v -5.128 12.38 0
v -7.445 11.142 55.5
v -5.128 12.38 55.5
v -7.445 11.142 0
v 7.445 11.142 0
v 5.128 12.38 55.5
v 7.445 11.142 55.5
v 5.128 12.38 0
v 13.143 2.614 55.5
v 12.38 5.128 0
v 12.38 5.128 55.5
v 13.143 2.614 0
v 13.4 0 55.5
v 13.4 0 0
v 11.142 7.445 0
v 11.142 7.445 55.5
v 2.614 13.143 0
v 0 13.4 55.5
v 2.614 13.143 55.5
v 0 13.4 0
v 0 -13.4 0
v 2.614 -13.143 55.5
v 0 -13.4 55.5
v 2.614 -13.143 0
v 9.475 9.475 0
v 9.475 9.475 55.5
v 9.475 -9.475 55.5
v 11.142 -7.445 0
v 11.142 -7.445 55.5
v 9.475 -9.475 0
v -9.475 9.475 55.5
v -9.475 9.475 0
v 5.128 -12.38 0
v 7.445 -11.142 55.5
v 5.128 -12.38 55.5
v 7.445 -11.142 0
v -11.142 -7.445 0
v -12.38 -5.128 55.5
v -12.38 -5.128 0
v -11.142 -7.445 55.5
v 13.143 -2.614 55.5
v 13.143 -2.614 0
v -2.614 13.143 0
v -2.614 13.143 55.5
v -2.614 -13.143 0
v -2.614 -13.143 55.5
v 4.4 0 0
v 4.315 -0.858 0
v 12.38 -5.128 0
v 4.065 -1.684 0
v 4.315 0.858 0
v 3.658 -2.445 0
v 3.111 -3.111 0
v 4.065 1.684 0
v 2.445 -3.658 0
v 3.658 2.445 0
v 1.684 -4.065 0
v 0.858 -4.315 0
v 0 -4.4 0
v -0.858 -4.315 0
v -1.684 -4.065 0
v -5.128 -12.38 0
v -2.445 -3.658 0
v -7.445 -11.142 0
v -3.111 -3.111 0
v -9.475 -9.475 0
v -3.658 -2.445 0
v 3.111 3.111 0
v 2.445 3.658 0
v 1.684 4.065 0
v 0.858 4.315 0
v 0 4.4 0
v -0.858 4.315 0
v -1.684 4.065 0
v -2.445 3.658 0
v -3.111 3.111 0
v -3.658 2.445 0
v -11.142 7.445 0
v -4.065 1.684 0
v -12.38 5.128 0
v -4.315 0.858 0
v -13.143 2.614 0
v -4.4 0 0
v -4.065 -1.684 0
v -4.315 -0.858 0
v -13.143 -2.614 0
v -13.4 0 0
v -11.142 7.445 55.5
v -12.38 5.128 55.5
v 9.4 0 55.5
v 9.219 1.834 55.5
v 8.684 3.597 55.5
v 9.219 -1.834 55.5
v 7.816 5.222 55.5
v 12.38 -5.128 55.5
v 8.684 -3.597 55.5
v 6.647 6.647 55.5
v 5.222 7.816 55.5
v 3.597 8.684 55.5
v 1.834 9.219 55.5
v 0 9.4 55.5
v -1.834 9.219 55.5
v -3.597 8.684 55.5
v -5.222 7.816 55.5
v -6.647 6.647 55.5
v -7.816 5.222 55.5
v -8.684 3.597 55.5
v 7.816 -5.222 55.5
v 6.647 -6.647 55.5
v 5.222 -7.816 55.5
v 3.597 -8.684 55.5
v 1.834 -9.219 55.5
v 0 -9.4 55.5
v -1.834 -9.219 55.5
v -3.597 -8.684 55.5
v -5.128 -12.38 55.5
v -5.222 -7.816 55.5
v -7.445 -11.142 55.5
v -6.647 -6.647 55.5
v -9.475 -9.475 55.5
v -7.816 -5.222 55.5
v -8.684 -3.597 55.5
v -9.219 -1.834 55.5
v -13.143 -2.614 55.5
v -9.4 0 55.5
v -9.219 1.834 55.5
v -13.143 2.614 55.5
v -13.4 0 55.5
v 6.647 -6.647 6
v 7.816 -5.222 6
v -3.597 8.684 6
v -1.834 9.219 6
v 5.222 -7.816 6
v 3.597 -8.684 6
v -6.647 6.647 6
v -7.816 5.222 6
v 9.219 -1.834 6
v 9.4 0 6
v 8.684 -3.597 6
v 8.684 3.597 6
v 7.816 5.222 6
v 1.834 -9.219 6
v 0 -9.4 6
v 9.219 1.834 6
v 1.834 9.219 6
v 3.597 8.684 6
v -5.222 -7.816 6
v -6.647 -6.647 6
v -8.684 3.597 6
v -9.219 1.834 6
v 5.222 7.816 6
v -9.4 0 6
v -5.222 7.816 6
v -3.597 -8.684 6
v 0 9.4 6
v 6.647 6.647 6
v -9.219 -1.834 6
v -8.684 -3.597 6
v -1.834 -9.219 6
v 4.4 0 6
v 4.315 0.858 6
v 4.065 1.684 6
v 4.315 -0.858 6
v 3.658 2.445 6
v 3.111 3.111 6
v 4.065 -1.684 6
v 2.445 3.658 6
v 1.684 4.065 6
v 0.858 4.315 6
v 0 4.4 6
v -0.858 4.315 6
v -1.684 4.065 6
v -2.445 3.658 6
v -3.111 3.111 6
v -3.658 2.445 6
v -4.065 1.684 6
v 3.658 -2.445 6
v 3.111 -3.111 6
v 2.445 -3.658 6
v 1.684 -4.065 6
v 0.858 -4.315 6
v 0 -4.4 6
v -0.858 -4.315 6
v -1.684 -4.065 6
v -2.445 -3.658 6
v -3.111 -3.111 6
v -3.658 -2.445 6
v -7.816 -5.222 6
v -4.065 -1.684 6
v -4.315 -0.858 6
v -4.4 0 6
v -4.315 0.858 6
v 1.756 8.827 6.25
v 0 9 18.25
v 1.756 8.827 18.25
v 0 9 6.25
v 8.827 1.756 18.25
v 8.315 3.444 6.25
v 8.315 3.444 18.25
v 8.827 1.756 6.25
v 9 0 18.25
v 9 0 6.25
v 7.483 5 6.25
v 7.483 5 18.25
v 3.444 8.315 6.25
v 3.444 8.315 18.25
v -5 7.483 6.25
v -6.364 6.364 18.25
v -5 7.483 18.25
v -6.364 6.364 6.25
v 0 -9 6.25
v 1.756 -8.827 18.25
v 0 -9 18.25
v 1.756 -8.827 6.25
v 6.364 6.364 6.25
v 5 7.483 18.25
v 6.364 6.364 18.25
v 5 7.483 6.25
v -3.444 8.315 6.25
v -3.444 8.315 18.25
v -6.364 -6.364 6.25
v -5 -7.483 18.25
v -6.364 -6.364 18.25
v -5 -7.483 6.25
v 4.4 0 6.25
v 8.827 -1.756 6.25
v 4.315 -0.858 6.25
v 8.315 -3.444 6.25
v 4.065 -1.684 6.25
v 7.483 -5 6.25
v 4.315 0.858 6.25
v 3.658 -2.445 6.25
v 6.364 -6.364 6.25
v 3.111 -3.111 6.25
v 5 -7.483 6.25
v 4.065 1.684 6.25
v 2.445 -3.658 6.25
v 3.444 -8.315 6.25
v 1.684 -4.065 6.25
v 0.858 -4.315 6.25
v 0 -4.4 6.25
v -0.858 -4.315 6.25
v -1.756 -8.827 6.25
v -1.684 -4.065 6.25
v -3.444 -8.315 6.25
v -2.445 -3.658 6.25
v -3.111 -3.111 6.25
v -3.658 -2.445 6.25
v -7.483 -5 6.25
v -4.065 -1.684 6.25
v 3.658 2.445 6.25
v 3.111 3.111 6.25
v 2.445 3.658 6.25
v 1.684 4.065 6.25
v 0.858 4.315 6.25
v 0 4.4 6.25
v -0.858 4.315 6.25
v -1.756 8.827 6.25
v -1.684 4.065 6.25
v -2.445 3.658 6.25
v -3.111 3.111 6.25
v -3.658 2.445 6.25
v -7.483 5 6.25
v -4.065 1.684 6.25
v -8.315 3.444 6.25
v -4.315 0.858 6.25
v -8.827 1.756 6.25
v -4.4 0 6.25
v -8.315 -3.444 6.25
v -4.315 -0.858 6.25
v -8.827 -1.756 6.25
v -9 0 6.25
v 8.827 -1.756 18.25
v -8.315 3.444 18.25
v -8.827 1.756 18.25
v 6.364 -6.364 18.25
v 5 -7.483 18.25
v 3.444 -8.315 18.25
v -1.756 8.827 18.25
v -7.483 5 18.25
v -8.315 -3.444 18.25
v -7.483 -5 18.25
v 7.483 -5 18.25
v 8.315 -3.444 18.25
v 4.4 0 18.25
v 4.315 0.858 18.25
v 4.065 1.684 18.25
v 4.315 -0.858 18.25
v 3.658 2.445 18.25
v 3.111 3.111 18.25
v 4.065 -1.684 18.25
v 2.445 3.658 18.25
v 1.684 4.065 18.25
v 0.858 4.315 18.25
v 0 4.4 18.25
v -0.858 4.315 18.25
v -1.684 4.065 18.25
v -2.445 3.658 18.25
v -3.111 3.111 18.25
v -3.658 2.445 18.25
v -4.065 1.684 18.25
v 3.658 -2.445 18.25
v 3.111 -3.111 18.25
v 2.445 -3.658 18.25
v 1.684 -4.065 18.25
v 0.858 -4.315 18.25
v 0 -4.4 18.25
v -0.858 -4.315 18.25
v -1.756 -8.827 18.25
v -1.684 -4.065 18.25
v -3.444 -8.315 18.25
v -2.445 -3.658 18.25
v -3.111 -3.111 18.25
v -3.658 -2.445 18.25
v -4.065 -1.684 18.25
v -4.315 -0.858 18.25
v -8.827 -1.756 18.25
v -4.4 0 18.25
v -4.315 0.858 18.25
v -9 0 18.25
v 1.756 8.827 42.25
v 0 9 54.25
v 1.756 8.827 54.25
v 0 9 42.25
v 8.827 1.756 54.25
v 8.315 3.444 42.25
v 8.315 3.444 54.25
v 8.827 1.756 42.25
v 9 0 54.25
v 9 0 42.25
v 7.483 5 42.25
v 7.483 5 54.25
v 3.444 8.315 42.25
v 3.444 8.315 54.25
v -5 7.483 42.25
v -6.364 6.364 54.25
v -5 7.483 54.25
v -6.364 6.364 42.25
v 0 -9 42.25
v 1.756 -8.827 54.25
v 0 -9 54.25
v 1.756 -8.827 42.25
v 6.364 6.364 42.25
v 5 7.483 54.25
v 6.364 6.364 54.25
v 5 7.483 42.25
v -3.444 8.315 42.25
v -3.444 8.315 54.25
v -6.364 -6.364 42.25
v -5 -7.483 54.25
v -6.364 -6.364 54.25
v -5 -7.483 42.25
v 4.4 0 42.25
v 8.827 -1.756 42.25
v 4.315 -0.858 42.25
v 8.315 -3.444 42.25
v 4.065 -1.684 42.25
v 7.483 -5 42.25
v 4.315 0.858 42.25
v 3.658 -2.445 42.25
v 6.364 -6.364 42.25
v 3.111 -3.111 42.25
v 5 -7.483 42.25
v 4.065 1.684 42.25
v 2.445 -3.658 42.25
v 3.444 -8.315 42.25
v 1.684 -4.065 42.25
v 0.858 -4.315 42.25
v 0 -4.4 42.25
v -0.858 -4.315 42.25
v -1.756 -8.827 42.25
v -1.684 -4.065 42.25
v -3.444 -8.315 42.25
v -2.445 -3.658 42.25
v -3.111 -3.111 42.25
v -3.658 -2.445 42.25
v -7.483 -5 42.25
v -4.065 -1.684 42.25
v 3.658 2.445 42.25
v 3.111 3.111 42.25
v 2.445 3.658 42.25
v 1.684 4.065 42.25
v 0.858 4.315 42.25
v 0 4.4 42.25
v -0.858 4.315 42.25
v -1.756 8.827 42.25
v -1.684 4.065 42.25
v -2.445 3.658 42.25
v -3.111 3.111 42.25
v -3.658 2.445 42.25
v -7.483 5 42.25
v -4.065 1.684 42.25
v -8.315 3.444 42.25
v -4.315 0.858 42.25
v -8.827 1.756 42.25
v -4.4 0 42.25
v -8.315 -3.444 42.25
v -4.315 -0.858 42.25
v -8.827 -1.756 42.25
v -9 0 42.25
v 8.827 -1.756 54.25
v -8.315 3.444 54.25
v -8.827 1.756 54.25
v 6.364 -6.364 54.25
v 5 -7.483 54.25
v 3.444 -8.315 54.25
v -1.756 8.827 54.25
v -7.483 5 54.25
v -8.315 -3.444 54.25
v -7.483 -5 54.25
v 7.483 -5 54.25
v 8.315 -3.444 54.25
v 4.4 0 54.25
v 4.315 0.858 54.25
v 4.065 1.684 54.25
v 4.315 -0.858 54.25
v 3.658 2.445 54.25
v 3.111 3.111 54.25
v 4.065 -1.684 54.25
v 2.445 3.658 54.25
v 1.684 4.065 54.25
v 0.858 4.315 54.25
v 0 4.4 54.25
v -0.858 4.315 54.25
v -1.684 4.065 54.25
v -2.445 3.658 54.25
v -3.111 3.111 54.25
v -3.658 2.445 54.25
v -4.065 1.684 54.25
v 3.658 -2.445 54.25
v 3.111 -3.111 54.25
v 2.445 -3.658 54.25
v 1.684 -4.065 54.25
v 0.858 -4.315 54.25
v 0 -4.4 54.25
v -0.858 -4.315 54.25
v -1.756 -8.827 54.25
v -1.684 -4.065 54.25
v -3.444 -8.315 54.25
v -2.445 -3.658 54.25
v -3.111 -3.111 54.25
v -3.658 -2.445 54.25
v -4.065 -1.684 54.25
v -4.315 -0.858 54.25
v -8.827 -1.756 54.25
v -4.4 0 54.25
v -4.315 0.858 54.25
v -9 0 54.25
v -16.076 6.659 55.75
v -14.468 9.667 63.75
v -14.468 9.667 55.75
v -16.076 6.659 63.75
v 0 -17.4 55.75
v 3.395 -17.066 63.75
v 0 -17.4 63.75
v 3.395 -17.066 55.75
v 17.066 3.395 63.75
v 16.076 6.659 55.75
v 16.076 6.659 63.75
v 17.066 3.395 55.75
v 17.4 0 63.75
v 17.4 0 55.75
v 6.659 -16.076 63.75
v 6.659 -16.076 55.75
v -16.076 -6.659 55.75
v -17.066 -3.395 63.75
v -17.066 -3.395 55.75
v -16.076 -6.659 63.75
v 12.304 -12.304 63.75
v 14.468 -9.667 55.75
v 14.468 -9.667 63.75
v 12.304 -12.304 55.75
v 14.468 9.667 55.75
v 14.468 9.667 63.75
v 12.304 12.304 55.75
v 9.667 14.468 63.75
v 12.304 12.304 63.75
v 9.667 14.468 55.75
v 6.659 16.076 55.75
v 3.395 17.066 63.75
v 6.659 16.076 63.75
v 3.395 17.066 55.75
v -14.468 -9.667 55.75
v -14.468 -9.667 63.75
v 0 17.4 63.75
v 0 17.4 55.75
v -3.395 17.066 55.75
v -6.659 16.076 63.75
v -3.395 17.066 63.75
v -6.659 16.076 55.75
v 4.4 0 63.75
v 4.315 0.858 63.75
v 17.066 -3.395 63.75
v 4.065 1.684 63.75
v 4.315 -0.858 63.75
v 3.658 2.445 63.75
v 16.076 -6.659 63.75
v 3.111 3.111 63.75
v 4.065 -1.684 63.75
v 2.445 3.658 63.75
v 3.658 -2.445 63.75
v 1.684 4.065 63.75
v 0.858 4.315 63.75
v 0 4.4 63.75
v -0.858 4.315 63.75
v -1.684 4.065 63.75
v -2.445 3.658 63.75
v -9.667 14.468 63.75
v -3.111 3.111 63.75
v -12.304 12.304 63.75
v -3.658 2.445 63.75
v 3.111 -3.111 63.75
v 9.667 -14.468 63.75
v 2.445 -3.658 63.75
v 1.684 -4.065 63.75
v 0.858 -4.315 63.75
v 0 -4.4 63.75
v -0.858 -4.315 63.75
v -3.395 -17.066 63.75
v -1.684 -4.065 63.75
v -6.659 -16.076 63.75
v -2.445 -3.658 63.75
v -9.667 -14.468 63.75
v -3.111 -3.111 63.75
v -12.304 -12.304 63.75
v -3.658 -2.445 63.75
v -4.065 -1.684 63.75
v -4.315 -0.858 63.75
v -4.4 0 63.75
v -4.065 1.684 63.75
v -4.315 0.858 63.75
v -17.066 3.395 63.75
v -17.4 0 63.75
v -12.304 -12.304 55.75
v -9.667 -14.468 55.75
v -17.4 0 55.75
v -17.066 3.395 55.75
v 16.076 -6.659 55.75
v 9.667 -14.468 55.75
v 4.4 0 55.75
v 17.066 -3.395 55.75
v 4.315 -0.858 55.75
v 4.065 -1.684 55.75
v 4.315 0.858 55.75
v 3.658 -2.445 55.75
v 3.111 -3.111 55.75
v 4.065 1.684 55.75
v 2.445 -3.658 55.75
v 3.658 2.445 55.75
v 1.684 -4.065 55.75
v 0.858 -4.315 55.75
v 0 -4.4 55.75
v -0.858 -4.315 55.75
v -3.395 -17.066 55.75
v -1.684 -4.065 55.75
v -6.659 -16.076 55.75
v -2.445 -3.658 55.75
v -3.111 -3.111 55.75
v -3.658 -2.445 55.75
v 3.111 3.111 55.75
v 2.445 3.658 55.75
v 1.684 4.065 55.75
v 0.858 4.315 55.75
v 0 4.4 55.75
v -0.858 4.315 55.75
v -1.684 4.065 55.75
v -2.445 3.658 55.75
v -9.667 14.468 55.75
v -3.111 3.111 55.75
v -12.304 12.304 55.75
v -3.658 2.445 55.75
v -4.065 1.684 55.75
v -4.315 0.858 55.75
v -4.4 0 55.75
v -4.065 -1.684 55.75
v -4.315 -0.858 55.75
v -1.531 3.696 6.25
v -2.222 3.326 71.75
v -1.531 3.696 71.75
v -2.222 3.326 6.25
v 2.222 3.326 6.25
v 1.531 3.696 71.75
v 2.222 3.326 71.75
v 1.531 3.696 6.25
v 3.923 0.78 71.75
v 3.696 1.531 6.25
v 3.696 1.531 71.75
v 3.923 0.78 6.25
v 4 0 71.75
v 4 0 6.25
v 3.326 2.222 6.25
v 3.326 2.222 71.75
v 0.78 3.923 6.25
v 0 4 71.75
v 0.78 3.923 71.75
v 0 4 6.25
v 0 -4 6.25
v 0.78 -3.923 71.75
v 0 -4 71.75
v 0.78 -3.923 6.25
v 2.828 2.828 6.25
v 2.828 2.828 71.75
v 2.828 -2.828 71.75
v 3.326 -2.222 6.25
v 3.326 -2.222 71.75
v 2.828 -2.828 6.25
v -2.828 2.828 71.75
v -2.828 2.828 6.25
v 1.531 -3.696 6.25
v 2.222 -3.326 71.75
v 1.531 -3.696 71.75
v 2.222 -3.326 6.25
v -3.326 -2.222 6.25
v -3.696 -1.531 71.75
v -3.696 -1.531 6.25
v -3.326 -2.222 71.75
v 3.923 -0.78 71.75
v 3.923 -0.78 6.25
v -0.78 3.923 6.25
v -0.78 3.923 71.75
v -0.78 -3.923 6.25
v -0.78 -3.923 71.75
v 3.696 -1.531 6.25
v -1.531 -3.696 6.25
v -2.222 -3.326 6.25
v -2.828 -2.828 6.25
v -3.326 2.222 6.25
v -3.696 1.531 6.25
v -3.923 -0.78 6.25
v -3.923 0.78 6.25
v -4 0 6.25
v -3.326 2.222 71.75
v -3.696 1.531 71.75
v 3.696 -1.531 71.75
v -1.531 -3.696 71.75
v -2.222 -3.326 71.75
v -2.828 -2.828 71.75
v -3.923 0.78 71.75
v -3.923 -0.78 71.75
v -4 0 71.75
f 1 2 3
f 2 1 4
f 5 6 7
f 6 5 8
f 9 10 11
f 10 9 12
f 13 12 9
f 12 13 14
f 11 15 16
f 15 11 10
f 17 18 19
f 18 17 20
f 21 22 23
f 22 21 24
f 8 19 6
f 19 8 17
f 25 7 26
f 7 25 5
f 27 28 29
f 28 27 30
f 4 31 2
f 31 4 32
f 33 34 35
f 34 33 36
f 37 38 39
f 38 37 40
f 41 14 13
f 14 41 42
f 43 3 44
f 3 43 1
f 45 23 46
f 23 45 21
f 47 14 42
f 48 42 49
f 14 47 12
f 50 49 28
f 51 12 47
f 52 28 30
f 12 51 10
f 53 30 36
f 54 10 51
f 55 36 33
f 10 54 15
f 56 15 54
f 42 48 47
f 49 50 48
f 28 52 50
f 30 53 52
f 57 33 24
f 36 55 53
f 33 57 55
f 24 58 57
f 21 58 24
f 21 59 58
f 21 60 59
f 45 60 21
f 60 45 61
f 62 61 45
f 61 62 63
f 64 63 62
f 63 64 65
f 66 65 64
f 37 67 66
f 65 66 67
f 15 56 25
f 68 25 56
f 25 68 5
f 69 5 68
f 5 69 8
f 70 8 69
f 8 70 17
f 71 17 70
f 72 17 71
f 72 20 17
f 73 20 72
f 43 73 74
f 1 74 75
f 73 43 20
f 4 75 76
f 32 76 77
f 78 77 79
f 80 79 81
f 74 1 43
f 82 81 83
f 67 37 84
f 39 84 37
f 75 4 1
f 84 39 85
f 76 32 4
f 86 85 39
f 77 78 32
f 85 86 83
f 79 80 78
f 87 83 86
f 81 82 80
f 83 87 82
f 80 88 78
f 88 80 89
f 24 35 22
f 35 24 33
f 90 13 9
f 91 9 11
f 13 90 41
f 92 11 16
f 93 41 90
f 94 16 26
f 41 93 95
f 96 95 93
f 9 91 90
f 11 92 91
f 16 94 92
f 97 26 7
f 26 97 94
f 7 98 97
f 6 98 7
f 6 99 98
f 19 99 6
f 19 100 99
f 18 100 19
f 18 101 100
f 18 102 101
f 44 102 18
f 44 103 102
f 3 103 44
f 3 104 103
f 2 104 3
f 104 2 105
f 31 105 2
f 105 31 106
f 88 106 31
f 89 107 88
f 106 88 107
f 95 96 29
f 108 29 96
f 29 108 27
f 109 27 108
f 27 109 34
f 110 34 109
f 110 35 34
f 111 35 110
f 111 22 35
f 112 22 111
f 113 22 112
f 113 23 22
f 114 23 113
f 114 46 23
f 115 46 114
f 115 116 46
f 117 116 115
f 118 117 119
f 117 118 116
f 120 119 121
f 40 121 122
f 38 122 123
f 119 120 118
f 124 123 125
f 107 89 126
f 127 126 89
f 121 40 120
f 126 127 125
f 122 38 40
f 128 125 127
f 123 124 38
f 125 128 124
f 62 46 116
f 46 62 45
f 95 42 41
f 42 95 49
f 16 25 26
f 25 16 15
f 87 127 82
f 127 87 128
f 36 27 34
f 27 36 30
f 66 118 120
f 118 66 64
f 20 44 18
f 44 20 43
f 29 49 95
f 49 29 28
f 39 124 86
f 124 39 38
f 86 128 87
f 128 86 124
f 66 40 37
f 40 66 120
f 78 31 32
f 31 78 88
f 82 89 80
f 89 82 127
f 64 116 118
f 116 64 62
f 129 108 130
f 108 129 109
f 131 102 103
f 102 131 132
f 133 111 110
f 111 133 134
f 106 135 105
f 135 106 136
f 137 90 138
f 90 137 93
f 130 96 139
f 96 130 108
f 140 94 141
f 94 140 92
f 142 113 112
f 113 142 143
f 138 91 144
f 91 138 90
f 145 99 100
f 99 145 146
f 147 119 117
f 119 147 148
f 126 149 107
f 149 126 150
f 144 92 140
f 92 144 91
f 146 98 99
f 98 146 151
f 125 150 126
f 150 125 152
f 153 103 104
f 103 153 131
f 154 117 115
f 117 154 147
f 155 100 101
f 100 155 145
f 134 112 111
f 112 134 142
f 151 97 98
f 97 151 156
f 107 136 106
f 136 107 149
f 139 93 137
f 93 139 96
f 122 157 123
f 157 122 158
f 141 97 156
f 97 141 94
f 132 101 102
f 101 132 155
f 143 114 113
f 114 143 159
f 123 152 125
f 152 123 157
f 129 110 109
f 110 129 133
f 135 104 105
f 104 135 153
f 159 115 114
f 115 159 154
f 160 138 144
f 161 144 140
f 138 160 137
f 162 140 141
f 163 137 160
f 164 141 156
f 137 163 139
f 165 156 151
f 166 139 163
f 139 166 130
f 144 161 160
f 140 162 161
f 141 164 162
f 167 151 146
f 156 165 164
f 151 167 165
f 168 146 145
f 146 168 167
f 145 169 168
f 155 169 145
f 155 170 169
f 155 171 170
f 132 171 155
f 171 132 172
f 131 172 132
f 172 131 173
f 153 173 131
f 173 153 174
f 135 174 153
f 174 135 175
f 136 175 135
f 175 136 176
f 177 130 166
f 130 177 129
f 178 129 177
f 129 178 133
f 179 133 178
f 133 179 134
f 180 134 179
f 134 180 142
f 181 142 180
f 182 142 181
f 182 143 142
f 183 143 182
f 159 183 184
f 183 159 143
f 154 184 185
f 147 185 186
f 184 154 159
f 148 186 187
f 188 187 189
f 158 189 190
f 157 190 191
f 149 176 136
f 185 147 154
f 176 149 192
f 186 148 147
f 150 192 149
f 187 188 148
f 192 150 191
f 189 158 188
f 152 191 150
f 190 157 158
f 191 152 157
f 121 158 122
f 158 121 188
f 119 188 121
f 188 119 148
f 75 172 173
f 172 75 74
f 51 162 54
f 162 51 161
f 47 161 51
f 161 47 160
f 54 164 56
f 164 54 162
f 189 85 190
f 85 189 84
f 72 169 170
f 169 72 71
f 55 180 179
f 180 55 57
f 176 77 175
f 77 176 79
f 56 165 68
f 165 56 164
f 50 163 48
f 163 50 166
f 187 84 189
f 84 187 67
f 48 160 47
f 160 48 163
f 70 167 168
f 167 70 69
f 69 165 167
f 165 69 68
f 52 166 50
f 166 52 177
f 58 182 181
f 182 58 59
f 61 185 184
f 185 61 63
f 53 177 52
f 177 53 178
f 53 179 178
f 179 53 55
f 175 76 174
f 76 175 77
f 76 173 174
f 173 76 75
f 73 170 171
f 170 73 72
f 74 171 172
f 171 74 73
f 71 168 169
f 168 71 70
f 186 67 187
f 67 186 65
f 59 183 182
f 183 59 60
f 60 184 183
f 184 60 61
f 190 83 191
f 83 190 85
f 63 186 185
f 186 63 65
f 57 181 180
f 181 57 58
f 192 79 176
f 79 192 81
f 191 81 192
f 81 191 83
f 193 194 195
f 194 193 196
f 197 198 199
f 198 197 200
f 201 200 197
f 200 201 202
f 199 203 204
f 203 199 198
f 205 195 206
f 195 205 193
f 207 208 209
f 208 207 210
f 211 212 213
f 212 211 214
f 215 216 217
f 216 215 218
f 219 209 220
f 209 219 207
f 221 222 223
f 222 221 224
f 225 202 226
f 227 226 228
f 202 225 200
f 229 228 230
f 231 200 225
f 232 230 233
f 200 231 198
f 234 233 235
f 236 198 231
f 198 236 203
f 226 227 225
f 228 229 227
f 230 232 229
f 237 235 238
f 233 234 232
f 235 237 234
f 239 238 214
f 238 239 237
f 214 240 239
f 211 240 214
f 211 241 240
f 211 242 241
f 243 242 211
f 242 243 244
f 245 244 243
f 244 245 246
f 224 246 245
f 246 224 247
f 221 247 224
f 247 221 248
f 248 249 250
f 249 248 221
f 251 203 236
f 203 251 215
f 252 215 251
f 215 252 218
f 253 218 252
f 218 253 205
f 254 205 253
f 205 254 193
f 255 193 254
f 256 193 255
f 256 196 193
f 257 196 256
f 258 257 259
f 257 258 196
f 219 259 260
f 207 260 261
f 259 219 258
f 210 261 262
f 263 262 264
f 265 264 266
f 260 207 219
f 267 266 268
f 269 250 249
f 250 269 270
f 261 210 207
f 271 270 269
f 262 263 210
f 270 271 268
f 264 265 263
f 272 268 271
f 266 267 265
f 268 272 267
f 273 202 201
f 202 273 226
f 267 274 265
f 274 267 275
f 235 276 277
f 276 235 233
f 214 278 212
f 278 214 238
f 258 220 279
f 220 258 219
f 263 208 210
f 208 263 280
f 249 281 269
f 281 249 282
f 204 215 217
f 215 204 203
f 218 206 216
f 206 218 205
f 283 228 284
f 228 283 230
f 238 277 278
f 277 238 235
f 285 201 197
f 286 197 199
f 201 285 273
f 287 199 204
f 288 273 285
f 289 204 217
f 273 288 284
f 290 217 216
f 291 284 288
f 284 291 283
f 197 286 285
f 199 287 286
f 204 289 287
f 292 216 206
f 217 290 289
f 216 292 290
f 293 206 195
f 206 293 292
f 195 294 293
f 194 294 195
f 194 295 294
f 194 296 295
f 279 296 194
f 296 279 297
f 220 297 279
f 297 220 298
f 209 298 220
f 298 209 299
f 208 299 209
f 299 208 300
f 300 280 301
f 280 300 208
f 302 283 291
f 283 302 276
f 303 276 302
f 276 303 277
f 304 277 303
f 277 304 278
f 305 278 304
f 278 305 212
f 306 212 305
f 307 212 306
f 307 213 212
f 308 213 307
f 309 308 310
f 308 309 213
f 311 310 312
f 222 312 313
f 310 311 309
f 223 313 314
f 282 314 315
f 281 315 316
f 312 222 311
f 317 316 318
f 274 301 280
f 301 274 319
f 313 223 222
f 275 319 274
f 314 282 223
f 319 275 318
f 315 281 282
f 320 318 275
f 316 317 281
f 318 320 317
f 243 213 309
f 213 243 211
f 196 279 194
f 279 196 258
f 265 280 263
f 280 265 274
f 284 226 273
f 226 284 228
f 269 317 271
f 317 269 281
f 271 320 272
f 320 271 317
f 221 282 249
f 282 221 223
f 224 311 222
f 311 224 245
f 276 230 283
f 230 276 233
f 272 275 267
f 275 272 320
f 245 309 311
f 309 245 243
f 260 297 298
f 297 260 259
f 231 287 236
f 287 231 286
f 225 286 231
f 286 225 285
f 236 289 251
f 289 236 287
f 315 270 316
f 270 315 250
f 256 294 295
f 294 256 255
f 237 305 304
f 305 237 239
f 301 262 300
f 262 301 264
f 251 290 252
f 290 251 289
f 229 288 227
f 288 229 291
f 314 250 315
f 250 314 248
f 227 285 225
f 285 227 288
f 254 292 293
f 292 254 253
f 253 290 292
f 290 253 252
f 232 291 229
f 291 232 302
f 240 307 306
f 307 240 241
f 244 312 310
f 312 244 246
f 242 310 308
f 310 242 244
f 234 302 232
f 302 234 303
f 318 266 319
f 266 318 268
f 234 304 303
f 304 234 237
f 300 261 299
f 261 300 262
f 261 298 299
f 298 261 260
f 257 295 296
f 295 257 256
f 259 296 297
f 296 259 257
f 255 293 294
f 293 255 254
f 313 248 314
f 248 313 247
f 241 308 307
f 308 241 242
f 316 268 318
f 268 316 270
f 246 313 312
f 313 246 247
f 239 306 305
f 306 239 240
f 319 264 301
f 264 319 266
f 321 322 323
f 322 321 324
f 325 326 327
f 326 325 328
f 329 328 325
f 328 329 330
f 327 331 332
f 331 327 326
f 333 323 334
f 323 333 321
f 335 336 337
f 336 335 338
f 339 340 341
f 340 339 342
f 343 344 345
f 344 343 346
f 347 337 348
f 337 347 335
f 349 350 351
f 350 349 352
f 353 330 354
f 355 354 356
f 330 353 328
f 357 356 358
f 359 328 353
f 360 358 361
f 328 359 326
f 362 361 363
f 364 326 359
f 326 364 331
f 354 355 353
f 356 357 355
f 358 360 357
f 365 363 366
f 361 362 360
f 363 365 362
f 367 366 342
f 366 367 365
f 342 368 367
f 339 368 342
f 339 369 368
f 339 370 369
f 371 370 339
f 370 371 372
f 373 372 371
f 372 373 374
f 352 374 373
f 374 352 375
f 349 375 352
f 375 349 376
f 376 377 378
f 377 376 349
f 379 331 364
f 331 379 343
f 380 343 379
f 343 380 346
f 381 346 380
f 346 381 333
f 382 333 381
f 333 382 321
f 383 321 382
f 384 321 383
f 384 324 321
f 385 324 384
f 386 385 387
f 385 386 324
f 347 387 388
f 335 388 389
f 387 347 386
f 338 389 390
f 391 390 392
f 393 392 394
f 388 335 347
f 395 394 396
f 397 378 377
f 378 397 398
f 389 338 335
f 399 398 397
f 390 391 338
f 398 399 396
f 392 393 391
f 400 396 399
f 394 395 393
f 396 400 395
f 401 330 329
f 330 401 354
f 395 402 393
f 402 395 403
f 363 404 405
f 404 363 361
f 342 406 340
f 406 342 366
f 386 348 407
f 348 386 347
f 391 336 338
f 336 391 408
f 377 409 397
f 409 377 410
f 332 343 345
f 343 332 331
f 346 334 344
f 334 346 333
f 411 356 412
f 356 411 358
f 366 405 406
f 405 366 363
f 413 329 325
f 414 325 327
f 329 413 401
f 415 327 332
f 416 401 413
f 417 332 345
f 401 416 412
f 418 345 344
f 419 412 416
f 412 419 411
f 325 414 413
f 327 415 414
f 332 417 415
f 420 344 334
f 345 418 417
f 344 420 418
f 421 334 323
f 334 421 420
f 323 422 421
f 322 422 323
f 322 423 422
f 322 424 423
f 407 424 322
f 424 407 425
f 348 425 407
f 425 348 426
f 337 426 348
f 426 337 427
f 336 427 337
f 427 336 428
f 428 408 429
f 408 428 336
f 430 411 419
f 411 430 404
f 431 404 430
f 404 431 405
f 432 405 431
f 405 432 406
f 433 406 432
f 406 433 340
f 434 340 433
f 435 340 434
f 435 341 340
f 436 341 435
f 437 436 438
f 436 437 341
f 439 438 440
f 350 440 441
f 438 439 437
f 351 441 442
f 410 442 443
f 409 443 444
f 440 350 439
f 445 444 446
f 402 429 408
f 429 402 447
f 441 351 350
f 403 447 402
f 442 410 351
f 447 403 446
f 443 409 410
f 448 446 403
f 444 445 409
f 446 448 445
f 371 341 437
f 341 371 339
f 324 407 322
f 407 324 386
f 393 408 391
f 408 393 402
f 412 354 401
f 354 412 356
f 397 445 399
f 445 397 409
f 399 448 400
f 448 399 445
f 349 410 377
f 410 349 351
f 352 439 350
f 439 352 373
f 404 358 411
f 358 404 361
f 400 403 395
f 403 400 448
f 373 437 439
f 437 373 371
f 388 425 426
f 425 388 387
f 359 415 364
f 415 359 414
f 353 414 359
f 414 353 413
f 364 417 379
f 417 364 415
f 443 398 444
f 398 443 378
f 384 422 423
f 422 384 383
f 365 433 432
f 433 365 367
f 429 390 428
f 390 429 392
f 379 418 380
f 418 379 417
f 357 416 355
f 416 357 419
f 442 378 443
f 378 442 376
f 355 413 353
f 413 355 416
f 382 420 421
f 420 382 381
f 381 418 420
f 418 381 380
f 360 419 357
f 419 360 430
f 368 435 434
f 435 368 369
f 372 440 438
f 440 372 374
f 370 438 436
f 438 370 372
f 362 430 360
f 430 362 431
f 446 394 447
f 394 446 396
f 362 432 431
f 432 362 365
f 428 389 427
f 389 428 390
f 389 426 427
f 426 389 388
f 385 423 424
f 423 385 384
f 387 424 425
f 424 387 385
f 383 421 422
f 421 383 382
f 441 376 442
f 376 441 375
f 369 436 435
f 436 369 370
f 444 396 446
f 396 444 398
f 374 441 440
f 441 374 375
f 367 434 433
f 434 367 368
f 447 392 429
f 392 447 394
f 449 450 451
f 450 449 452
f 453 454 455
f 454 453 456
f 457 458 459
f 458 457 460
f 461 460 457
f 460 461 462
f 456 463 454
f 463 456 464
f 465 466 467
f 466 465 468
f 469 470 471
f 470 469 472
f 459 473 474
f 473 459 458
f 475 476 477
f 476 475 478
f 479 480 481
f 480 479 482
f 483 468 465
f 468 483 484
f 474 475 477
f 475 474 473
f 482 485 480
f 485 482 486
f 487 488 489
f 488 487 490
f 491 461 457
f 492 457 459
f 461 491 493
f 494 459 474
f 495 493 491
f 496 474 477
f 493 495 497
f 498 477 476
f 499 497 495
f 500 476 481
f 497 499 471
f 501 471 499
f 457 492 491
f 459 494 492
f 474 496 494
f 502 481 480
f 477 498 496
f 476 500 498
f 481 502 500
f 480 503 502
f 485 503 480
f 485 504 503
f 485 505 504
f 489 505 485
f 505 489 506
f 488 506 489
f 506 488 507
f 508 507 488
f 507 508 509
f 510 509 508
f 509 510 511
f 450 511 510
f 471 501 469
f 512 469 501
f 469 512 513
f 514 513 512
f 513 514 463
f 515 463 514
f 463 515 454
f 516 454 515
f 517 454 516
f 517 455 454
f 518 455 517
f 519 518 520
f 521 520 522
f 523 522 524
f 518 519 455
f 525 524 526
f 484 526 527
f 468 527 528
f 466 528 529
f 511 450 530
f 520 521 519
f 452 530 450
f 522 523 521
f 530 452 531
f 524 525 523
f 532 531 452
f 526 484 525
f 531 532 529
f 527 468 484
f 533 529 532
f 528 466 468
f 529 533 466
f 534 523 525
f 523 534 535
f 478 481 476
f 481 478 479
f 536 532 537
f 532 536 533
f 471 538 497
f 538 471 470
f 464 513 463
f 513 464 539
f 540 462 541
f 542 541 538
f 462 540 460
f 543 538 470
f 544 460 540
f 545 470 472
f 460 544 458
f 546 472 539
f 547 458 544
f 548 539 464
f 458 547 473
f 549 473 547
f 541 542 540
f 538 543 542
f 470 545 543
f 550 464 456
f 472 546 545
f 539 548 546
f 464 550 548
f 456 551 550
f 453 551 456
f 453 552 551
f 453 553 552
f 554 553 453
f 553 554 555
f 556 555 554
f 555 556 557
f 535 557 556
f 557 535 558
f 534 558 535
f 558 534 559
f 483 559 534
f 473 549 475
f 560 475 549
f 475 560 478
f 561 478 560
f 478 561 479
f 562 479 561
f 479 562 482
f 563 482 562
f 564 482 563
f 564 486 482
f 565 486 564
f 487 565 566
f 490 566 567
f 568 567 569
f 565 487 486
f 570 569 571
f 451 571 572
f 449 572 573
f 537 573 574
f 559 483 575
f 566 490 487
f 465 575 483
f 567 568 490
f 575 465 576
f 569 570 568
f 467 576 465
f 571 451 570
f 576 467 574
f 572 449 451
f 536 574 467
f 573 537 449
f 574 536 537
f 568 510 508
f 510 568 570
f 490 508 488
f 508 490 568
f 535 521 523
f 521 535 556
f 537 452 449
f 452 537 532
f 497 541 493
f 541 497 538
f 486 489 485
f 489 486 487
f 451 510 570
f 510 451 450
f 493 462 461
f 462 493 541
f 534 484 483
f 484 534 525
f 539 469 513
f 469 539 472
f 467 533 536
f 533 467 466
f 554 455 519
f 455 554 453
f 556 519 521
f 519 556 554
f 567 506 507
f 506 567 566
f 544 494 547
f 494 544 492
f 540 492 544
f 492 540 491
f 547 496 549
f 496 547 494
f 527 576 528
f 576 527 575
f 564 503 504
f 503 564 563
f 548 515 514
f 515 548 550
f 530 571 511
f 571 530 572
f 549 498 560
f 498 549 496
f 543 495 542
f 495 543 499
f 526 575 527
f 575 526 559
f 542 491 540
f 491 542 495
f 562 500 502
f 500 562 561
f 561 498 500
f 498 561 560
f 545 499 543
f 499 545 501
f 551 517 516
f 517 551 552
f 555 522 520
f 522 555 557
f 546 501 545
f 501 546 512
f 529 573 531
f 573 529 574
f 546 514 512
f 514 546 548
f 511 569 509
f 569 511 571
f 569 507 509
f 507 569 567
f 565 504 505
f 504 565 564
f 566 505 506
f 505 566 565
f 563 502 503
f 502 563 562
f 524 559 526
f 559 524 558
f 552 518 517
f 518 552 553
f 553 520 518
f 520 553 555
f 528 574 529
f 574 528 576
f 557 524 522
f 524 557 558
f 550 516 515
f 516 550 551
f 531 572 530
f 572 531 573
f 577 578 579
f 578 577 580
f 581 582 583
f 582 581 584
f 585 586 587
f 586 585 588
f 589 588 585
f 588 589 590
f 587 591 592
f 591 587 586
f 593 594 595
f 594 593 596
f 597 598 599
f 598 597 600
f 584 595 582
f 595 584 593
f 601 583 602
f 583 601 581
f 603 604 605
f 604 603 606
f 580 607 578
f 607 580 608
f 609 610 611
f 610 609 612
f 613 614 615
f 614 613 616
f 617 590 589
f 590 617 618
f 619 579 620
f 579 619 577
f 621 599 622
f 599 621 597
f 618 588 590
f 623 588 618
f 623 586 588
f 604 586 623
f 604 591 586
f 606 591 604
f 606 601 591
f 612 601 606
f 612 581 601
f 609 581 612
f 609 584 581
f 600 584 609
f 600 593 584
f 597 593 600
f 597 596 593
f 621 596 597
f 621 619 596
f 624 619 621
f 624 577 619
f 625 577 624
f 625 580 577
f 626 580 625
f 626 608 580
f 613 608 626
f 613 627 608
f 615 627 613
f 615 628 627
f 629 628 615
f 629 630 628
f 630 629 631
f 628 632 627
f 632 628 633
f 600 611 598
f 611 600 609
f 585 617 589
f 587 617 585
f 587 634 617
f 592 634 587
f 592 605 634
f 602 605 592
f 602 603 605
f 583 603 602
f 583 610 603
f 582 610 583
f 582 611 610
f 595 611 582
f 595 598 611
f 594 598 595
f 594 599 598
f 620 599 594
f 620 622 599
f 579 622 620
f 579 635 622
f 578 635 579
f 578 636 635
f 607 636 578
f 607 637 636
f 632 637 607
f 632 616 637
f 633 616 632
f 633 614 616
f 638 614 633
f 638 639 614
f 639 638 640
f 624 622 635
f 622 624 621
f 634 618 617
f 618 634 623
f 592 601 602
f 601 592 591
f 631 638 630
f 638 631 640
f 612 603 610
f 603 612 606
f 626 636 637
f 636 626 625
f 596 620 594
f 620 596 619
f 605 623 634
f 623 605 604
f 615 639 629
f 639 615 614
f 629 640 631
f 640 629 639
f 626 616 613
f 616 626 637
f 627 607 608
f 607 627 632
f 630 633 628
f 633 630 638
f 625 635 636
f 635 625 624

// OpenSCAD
$fn = 32;

// ------------------------------------------------------------------------
// Shaft station: cup d26.8 x 55.5 mm, shaft d8
// Every part is its own module, assembly() places every instance.
// ------------------------------------------------------------------------

// --- part 1 ---
module housing_cup() {
  difference() {
    cylinder(h = 55.5, d = 26.8);
    translate([0, 0, 6]) cylinder(h = 50.5, d = 18.8);
    translate([0, 0, -1]) cylinder(h = 8, d = 8.8);
  }
}

// --- part 2 ---
module bearing_lower() {
  difference() {
      translate([0, 0, 0]) cylinder(h = 12, d = 18);
      translate([0, 0, -1]) cylinder(h = 14, d = 8.8);
    }
}

// --- part 3 ---
module bearing_upper() {
  difference() {
      translate([0, 0, 0]) cylinder(h = 12, d = 18);
      translate([0, 0, -1]) cylinder(h = 14, d = 8.8);
    }
}

// --- part 4 ---
module station_shaft() {
  translate([0, 0, -32.75]) cylinder(h = 65.5, d = 8);
}

// --- part 5 ---
module station_cover() {
  difference() {
    cylinder(h = 8, d = 34.8);
    translate([0, 0, -1]) cylinder(h = 10, d = 8.8);
  }
}

// --- assembly ---
module assembly() {
  color([0.80, 0.24, 0.20]) translate([0, 0, 0]) rotate([0, 0, 0]) housing_cup();
  color([0.20, 0.45, 0.75]) translate([0, 0, 6.25]) rotate([0, 0, 0]) bearing_lower();
  color([0.25, 0.62, 0.32]) translate([0, 0, 42.25]) rotate([0, 0, 0]) bearing_upper();
  color([0.92, 0.70, 0.18]) translate([0, 0, 39]) rotate([0, 0, 0]) station_shaft();
  color([0.58, 0.35, 0.70]) translate([0, 0, 55.75]) rotate([0, 0, 0]) station_cover();
}

assembly();
